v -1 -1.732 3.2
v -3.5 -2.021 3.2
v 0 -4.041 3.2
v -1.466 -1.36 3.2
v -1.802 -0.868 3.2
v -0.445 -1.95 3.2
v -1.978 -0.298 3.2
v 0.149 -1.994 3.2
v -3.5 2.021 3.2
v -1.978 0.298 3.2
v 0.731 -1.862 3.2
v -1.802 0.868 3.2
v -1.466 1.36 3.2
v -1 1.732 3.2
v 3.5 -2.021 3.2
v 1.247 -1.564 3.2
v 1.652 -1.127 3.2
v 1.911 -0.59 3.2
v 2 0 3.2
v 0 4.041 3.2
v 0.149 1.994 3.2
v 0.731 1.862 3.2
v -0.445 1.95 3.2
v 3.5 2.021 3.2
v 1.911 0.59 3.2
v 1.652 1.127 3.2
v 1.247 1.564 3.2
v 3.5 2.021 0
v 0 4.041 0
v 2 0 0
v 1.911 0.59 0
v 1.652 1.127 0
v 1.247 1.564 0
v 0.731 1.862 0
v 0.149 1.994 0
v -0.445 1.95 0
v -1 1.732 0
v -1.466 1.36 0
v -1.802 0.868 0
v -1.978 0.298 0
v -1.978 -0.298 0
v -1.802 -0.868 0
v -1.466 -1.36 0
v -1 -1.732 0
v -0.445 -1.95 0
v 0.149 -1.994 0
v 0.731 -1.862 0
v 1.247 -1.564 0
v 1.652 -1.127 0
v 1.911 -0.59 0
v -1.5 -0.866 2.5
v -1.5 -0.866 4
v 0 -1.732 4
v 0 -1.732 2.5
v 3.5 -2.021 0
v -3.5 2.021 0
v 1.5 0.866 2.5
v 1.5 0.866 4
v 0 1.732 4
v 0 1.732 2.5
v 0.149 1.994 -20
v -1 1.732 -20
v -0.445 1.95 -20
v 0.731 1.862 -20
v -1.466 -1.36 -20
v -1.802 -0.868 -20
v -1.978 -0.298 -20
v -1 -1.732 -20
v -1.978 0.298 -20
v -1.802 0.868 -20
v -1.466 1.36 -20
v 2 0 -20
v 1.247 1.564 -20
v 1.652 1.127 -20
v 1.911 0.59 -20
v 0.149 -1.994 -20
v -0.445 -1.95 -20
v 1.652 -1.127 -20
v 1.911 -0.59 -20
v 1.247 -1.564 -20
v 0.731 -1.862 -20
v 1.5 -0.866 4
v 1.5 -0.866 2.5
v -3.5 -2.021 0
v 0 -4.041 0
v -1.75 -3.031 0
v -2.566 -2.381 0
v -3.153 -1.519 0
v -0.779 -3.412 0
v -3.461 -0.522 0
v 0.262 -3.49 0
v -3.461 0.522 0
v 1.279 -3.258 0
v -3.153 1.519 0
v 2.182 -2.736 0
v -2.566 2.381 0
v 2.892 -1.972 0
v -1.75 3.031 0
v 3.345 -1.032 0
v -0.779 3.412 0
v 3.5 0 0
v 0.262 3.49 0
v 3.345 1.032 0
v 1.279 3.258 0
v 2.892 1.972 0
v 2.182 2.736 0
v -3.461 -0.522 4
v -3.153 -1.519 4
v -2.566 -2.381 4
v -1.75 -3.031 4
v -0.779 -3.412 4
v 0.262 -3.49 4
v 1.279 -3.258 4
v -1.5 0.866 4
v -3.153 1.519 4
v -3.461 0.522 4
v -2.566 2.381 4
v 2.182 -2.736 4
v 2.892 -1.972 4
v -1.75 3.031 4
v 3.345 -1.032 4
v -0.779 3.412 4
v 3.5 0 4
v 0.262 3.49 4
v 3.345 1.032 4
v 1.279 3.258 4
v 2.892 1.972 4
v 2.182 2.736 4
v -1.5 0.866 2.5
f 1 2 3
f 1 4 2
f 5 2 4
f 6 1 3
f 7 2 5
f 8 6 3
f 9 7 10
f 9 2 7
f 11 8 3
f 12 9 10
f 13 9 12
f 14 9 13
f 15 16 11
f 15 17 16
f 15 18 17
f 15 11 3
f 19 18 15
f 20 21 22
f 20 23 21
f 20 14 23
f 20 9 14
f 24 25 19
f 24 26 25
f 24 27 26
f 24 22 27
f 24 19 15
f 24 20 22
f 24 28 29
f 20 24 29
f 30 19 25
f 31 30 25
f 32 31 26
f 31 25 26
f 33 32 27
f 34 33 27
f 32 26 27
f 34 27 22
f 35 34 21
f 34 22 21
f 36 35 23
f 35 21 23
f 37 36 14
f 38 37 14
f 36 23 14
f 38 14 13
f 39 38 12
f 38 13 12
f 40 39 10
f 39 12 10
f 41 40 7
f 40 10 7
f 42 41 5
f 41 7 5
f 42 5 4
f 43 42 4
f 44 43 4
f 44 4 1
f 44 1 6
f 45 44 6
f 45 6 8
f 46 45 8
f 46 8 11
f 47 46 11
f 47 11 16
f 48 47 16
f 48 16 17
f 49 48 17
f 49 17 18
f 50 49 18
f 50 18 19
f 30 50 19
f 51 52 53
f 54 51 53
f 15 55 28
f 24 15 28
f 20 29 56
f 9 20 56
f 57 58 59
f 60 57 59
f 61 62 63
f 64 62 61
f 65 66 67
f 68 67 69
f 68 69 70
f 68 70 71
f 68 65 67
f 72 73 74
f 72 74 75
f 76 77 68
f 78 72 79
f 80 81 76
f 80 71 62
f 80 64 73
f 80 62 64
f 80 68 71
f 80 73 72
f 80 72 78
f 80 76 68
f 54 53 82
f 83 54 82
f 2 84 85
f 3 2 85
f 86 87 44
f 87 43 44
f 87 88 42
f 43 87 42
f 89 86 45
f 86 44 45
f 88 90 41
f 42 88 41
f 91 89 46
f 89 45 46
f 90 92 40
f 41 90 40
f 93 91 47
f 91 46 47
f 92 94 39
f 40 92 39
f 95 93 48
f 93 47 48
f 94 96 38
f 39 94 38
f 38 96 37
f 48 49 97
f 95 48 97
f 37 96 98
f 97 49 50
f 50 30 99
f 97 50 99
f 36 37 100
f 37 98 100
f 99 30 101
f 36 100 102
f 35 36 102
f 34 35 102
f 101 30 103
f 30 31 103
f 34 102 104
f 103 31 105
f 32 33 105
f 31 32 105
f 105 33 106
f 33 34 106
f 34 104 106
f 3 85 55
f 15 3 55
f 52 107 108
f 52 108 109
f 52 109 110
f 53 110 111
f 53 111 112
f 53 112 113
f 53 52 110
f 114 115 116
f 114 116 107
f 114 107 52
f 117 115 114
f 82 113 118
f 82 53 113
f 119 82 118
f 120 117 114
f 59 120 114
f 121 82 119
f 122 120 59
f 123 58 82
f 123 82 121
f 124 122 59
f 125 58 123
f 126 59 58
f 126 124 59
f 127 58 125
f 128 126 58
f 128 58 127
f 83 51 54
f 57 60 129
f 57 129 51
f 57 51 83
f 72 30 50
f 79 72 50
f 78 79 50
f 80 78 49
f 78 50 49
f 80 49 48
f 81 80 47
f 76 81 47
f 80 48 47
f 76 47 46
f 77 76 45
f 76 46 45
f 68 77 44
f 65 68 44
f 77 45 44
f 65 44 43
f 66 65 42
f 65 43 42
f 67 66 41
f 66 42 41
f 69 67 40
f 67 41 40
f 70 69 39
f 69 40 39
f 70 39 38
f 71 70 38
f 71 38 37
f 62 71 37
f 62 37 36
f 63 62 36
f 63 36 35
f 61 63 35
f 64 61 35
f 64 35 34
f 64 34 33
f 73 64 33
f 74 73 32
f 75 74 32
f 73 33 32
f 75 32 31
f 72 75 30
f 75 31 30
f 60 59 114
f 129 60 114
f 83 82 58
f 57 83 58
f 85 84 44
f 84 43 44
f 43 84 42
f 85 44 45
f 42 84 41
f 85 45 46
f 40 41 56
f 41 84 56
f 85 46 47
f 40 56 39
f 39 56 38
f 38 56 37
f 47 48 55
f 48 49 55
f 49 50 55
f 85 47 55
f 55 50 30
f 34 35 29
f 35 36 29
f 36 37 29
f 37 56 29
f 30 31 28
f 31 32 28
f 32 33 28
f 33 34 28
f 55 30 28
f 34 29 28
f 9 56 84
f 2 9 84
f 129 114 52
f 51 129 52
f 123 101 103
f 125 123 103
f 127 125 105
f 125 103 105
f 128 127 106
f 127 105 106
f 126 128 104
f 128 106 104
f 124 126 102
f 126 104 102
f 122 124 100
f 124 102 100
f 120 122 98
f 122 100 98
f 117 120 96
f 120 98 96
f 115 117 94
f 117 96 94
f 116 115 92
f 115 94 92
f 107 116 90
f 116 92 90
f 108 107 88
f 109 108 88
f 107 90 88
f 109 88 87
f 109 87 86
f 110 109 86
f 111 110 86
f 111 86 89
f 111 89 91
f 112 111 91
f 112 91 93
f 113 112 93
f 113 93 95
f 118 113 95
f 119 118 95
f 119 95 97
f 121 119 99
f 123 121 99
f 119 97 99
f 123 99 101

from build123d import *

# Parameters (mm, degrees)
F0_R     = 3.5
F1_DEPTH = 4
F3_DEPTH = 1.5
F4_R     = 2
F5_DEPTH = 20
F7_DEPTH = 3.2
F8_R     = 2
F9_DEPTH = 25


with BuildPart() as f1:
    # F0 (on Top) → F1 (new body)
    with BuildSketch(Plane.XY):
        Circle(F0_R)
    extrude(amount=F1_DEPTH)

    # F2 (on face) → F3 (cut)
    with BuildSketch(Plane.XY.offset(4)):
        Polygon((1.5, 0.8660254038), (0, 1.7320508076), (-1.5, 0.8660254038), (-1.5, -0.8660254038), (0, -1.7320508076), (1.5, -0.8660254038), align=None)
    extrude(amount=-F3_DEPTH, mode=Mode.SUBTRACT)

    # F4 (on face) → F5 (join)
    with BuildSketch(Plane(origin=(0, 0, 0), x_dir=(1, 0, 0), z_dir=(0, 0, -1))):
        Circle(F4_R)
    extrude(amount=F5_DEPTH)


with BuildPart() as f7:
    # F6 (on Top) → F7 (new body)
    with BuildSketch(Plane.XY):
        Polygon((3.5, 2.0207259422), (0, 4.0414518843), (-3.5, 2.0207259422), (-3.5, -2.0207259422), (0, -4.0414518843), (3.5, -2.0207259422), align=None)
    extrude(amount=F7_DEPTH)

    # F8 (on face) → F9 (cut)
    with BuildSketch(Plane.XY.offset(3.2)):
        Circle(F8_R)
    extrude(amount=-F9_DEPTH, mode=Mode.SUBTRACT)


solid = Compound([f1.part, f7.part])
